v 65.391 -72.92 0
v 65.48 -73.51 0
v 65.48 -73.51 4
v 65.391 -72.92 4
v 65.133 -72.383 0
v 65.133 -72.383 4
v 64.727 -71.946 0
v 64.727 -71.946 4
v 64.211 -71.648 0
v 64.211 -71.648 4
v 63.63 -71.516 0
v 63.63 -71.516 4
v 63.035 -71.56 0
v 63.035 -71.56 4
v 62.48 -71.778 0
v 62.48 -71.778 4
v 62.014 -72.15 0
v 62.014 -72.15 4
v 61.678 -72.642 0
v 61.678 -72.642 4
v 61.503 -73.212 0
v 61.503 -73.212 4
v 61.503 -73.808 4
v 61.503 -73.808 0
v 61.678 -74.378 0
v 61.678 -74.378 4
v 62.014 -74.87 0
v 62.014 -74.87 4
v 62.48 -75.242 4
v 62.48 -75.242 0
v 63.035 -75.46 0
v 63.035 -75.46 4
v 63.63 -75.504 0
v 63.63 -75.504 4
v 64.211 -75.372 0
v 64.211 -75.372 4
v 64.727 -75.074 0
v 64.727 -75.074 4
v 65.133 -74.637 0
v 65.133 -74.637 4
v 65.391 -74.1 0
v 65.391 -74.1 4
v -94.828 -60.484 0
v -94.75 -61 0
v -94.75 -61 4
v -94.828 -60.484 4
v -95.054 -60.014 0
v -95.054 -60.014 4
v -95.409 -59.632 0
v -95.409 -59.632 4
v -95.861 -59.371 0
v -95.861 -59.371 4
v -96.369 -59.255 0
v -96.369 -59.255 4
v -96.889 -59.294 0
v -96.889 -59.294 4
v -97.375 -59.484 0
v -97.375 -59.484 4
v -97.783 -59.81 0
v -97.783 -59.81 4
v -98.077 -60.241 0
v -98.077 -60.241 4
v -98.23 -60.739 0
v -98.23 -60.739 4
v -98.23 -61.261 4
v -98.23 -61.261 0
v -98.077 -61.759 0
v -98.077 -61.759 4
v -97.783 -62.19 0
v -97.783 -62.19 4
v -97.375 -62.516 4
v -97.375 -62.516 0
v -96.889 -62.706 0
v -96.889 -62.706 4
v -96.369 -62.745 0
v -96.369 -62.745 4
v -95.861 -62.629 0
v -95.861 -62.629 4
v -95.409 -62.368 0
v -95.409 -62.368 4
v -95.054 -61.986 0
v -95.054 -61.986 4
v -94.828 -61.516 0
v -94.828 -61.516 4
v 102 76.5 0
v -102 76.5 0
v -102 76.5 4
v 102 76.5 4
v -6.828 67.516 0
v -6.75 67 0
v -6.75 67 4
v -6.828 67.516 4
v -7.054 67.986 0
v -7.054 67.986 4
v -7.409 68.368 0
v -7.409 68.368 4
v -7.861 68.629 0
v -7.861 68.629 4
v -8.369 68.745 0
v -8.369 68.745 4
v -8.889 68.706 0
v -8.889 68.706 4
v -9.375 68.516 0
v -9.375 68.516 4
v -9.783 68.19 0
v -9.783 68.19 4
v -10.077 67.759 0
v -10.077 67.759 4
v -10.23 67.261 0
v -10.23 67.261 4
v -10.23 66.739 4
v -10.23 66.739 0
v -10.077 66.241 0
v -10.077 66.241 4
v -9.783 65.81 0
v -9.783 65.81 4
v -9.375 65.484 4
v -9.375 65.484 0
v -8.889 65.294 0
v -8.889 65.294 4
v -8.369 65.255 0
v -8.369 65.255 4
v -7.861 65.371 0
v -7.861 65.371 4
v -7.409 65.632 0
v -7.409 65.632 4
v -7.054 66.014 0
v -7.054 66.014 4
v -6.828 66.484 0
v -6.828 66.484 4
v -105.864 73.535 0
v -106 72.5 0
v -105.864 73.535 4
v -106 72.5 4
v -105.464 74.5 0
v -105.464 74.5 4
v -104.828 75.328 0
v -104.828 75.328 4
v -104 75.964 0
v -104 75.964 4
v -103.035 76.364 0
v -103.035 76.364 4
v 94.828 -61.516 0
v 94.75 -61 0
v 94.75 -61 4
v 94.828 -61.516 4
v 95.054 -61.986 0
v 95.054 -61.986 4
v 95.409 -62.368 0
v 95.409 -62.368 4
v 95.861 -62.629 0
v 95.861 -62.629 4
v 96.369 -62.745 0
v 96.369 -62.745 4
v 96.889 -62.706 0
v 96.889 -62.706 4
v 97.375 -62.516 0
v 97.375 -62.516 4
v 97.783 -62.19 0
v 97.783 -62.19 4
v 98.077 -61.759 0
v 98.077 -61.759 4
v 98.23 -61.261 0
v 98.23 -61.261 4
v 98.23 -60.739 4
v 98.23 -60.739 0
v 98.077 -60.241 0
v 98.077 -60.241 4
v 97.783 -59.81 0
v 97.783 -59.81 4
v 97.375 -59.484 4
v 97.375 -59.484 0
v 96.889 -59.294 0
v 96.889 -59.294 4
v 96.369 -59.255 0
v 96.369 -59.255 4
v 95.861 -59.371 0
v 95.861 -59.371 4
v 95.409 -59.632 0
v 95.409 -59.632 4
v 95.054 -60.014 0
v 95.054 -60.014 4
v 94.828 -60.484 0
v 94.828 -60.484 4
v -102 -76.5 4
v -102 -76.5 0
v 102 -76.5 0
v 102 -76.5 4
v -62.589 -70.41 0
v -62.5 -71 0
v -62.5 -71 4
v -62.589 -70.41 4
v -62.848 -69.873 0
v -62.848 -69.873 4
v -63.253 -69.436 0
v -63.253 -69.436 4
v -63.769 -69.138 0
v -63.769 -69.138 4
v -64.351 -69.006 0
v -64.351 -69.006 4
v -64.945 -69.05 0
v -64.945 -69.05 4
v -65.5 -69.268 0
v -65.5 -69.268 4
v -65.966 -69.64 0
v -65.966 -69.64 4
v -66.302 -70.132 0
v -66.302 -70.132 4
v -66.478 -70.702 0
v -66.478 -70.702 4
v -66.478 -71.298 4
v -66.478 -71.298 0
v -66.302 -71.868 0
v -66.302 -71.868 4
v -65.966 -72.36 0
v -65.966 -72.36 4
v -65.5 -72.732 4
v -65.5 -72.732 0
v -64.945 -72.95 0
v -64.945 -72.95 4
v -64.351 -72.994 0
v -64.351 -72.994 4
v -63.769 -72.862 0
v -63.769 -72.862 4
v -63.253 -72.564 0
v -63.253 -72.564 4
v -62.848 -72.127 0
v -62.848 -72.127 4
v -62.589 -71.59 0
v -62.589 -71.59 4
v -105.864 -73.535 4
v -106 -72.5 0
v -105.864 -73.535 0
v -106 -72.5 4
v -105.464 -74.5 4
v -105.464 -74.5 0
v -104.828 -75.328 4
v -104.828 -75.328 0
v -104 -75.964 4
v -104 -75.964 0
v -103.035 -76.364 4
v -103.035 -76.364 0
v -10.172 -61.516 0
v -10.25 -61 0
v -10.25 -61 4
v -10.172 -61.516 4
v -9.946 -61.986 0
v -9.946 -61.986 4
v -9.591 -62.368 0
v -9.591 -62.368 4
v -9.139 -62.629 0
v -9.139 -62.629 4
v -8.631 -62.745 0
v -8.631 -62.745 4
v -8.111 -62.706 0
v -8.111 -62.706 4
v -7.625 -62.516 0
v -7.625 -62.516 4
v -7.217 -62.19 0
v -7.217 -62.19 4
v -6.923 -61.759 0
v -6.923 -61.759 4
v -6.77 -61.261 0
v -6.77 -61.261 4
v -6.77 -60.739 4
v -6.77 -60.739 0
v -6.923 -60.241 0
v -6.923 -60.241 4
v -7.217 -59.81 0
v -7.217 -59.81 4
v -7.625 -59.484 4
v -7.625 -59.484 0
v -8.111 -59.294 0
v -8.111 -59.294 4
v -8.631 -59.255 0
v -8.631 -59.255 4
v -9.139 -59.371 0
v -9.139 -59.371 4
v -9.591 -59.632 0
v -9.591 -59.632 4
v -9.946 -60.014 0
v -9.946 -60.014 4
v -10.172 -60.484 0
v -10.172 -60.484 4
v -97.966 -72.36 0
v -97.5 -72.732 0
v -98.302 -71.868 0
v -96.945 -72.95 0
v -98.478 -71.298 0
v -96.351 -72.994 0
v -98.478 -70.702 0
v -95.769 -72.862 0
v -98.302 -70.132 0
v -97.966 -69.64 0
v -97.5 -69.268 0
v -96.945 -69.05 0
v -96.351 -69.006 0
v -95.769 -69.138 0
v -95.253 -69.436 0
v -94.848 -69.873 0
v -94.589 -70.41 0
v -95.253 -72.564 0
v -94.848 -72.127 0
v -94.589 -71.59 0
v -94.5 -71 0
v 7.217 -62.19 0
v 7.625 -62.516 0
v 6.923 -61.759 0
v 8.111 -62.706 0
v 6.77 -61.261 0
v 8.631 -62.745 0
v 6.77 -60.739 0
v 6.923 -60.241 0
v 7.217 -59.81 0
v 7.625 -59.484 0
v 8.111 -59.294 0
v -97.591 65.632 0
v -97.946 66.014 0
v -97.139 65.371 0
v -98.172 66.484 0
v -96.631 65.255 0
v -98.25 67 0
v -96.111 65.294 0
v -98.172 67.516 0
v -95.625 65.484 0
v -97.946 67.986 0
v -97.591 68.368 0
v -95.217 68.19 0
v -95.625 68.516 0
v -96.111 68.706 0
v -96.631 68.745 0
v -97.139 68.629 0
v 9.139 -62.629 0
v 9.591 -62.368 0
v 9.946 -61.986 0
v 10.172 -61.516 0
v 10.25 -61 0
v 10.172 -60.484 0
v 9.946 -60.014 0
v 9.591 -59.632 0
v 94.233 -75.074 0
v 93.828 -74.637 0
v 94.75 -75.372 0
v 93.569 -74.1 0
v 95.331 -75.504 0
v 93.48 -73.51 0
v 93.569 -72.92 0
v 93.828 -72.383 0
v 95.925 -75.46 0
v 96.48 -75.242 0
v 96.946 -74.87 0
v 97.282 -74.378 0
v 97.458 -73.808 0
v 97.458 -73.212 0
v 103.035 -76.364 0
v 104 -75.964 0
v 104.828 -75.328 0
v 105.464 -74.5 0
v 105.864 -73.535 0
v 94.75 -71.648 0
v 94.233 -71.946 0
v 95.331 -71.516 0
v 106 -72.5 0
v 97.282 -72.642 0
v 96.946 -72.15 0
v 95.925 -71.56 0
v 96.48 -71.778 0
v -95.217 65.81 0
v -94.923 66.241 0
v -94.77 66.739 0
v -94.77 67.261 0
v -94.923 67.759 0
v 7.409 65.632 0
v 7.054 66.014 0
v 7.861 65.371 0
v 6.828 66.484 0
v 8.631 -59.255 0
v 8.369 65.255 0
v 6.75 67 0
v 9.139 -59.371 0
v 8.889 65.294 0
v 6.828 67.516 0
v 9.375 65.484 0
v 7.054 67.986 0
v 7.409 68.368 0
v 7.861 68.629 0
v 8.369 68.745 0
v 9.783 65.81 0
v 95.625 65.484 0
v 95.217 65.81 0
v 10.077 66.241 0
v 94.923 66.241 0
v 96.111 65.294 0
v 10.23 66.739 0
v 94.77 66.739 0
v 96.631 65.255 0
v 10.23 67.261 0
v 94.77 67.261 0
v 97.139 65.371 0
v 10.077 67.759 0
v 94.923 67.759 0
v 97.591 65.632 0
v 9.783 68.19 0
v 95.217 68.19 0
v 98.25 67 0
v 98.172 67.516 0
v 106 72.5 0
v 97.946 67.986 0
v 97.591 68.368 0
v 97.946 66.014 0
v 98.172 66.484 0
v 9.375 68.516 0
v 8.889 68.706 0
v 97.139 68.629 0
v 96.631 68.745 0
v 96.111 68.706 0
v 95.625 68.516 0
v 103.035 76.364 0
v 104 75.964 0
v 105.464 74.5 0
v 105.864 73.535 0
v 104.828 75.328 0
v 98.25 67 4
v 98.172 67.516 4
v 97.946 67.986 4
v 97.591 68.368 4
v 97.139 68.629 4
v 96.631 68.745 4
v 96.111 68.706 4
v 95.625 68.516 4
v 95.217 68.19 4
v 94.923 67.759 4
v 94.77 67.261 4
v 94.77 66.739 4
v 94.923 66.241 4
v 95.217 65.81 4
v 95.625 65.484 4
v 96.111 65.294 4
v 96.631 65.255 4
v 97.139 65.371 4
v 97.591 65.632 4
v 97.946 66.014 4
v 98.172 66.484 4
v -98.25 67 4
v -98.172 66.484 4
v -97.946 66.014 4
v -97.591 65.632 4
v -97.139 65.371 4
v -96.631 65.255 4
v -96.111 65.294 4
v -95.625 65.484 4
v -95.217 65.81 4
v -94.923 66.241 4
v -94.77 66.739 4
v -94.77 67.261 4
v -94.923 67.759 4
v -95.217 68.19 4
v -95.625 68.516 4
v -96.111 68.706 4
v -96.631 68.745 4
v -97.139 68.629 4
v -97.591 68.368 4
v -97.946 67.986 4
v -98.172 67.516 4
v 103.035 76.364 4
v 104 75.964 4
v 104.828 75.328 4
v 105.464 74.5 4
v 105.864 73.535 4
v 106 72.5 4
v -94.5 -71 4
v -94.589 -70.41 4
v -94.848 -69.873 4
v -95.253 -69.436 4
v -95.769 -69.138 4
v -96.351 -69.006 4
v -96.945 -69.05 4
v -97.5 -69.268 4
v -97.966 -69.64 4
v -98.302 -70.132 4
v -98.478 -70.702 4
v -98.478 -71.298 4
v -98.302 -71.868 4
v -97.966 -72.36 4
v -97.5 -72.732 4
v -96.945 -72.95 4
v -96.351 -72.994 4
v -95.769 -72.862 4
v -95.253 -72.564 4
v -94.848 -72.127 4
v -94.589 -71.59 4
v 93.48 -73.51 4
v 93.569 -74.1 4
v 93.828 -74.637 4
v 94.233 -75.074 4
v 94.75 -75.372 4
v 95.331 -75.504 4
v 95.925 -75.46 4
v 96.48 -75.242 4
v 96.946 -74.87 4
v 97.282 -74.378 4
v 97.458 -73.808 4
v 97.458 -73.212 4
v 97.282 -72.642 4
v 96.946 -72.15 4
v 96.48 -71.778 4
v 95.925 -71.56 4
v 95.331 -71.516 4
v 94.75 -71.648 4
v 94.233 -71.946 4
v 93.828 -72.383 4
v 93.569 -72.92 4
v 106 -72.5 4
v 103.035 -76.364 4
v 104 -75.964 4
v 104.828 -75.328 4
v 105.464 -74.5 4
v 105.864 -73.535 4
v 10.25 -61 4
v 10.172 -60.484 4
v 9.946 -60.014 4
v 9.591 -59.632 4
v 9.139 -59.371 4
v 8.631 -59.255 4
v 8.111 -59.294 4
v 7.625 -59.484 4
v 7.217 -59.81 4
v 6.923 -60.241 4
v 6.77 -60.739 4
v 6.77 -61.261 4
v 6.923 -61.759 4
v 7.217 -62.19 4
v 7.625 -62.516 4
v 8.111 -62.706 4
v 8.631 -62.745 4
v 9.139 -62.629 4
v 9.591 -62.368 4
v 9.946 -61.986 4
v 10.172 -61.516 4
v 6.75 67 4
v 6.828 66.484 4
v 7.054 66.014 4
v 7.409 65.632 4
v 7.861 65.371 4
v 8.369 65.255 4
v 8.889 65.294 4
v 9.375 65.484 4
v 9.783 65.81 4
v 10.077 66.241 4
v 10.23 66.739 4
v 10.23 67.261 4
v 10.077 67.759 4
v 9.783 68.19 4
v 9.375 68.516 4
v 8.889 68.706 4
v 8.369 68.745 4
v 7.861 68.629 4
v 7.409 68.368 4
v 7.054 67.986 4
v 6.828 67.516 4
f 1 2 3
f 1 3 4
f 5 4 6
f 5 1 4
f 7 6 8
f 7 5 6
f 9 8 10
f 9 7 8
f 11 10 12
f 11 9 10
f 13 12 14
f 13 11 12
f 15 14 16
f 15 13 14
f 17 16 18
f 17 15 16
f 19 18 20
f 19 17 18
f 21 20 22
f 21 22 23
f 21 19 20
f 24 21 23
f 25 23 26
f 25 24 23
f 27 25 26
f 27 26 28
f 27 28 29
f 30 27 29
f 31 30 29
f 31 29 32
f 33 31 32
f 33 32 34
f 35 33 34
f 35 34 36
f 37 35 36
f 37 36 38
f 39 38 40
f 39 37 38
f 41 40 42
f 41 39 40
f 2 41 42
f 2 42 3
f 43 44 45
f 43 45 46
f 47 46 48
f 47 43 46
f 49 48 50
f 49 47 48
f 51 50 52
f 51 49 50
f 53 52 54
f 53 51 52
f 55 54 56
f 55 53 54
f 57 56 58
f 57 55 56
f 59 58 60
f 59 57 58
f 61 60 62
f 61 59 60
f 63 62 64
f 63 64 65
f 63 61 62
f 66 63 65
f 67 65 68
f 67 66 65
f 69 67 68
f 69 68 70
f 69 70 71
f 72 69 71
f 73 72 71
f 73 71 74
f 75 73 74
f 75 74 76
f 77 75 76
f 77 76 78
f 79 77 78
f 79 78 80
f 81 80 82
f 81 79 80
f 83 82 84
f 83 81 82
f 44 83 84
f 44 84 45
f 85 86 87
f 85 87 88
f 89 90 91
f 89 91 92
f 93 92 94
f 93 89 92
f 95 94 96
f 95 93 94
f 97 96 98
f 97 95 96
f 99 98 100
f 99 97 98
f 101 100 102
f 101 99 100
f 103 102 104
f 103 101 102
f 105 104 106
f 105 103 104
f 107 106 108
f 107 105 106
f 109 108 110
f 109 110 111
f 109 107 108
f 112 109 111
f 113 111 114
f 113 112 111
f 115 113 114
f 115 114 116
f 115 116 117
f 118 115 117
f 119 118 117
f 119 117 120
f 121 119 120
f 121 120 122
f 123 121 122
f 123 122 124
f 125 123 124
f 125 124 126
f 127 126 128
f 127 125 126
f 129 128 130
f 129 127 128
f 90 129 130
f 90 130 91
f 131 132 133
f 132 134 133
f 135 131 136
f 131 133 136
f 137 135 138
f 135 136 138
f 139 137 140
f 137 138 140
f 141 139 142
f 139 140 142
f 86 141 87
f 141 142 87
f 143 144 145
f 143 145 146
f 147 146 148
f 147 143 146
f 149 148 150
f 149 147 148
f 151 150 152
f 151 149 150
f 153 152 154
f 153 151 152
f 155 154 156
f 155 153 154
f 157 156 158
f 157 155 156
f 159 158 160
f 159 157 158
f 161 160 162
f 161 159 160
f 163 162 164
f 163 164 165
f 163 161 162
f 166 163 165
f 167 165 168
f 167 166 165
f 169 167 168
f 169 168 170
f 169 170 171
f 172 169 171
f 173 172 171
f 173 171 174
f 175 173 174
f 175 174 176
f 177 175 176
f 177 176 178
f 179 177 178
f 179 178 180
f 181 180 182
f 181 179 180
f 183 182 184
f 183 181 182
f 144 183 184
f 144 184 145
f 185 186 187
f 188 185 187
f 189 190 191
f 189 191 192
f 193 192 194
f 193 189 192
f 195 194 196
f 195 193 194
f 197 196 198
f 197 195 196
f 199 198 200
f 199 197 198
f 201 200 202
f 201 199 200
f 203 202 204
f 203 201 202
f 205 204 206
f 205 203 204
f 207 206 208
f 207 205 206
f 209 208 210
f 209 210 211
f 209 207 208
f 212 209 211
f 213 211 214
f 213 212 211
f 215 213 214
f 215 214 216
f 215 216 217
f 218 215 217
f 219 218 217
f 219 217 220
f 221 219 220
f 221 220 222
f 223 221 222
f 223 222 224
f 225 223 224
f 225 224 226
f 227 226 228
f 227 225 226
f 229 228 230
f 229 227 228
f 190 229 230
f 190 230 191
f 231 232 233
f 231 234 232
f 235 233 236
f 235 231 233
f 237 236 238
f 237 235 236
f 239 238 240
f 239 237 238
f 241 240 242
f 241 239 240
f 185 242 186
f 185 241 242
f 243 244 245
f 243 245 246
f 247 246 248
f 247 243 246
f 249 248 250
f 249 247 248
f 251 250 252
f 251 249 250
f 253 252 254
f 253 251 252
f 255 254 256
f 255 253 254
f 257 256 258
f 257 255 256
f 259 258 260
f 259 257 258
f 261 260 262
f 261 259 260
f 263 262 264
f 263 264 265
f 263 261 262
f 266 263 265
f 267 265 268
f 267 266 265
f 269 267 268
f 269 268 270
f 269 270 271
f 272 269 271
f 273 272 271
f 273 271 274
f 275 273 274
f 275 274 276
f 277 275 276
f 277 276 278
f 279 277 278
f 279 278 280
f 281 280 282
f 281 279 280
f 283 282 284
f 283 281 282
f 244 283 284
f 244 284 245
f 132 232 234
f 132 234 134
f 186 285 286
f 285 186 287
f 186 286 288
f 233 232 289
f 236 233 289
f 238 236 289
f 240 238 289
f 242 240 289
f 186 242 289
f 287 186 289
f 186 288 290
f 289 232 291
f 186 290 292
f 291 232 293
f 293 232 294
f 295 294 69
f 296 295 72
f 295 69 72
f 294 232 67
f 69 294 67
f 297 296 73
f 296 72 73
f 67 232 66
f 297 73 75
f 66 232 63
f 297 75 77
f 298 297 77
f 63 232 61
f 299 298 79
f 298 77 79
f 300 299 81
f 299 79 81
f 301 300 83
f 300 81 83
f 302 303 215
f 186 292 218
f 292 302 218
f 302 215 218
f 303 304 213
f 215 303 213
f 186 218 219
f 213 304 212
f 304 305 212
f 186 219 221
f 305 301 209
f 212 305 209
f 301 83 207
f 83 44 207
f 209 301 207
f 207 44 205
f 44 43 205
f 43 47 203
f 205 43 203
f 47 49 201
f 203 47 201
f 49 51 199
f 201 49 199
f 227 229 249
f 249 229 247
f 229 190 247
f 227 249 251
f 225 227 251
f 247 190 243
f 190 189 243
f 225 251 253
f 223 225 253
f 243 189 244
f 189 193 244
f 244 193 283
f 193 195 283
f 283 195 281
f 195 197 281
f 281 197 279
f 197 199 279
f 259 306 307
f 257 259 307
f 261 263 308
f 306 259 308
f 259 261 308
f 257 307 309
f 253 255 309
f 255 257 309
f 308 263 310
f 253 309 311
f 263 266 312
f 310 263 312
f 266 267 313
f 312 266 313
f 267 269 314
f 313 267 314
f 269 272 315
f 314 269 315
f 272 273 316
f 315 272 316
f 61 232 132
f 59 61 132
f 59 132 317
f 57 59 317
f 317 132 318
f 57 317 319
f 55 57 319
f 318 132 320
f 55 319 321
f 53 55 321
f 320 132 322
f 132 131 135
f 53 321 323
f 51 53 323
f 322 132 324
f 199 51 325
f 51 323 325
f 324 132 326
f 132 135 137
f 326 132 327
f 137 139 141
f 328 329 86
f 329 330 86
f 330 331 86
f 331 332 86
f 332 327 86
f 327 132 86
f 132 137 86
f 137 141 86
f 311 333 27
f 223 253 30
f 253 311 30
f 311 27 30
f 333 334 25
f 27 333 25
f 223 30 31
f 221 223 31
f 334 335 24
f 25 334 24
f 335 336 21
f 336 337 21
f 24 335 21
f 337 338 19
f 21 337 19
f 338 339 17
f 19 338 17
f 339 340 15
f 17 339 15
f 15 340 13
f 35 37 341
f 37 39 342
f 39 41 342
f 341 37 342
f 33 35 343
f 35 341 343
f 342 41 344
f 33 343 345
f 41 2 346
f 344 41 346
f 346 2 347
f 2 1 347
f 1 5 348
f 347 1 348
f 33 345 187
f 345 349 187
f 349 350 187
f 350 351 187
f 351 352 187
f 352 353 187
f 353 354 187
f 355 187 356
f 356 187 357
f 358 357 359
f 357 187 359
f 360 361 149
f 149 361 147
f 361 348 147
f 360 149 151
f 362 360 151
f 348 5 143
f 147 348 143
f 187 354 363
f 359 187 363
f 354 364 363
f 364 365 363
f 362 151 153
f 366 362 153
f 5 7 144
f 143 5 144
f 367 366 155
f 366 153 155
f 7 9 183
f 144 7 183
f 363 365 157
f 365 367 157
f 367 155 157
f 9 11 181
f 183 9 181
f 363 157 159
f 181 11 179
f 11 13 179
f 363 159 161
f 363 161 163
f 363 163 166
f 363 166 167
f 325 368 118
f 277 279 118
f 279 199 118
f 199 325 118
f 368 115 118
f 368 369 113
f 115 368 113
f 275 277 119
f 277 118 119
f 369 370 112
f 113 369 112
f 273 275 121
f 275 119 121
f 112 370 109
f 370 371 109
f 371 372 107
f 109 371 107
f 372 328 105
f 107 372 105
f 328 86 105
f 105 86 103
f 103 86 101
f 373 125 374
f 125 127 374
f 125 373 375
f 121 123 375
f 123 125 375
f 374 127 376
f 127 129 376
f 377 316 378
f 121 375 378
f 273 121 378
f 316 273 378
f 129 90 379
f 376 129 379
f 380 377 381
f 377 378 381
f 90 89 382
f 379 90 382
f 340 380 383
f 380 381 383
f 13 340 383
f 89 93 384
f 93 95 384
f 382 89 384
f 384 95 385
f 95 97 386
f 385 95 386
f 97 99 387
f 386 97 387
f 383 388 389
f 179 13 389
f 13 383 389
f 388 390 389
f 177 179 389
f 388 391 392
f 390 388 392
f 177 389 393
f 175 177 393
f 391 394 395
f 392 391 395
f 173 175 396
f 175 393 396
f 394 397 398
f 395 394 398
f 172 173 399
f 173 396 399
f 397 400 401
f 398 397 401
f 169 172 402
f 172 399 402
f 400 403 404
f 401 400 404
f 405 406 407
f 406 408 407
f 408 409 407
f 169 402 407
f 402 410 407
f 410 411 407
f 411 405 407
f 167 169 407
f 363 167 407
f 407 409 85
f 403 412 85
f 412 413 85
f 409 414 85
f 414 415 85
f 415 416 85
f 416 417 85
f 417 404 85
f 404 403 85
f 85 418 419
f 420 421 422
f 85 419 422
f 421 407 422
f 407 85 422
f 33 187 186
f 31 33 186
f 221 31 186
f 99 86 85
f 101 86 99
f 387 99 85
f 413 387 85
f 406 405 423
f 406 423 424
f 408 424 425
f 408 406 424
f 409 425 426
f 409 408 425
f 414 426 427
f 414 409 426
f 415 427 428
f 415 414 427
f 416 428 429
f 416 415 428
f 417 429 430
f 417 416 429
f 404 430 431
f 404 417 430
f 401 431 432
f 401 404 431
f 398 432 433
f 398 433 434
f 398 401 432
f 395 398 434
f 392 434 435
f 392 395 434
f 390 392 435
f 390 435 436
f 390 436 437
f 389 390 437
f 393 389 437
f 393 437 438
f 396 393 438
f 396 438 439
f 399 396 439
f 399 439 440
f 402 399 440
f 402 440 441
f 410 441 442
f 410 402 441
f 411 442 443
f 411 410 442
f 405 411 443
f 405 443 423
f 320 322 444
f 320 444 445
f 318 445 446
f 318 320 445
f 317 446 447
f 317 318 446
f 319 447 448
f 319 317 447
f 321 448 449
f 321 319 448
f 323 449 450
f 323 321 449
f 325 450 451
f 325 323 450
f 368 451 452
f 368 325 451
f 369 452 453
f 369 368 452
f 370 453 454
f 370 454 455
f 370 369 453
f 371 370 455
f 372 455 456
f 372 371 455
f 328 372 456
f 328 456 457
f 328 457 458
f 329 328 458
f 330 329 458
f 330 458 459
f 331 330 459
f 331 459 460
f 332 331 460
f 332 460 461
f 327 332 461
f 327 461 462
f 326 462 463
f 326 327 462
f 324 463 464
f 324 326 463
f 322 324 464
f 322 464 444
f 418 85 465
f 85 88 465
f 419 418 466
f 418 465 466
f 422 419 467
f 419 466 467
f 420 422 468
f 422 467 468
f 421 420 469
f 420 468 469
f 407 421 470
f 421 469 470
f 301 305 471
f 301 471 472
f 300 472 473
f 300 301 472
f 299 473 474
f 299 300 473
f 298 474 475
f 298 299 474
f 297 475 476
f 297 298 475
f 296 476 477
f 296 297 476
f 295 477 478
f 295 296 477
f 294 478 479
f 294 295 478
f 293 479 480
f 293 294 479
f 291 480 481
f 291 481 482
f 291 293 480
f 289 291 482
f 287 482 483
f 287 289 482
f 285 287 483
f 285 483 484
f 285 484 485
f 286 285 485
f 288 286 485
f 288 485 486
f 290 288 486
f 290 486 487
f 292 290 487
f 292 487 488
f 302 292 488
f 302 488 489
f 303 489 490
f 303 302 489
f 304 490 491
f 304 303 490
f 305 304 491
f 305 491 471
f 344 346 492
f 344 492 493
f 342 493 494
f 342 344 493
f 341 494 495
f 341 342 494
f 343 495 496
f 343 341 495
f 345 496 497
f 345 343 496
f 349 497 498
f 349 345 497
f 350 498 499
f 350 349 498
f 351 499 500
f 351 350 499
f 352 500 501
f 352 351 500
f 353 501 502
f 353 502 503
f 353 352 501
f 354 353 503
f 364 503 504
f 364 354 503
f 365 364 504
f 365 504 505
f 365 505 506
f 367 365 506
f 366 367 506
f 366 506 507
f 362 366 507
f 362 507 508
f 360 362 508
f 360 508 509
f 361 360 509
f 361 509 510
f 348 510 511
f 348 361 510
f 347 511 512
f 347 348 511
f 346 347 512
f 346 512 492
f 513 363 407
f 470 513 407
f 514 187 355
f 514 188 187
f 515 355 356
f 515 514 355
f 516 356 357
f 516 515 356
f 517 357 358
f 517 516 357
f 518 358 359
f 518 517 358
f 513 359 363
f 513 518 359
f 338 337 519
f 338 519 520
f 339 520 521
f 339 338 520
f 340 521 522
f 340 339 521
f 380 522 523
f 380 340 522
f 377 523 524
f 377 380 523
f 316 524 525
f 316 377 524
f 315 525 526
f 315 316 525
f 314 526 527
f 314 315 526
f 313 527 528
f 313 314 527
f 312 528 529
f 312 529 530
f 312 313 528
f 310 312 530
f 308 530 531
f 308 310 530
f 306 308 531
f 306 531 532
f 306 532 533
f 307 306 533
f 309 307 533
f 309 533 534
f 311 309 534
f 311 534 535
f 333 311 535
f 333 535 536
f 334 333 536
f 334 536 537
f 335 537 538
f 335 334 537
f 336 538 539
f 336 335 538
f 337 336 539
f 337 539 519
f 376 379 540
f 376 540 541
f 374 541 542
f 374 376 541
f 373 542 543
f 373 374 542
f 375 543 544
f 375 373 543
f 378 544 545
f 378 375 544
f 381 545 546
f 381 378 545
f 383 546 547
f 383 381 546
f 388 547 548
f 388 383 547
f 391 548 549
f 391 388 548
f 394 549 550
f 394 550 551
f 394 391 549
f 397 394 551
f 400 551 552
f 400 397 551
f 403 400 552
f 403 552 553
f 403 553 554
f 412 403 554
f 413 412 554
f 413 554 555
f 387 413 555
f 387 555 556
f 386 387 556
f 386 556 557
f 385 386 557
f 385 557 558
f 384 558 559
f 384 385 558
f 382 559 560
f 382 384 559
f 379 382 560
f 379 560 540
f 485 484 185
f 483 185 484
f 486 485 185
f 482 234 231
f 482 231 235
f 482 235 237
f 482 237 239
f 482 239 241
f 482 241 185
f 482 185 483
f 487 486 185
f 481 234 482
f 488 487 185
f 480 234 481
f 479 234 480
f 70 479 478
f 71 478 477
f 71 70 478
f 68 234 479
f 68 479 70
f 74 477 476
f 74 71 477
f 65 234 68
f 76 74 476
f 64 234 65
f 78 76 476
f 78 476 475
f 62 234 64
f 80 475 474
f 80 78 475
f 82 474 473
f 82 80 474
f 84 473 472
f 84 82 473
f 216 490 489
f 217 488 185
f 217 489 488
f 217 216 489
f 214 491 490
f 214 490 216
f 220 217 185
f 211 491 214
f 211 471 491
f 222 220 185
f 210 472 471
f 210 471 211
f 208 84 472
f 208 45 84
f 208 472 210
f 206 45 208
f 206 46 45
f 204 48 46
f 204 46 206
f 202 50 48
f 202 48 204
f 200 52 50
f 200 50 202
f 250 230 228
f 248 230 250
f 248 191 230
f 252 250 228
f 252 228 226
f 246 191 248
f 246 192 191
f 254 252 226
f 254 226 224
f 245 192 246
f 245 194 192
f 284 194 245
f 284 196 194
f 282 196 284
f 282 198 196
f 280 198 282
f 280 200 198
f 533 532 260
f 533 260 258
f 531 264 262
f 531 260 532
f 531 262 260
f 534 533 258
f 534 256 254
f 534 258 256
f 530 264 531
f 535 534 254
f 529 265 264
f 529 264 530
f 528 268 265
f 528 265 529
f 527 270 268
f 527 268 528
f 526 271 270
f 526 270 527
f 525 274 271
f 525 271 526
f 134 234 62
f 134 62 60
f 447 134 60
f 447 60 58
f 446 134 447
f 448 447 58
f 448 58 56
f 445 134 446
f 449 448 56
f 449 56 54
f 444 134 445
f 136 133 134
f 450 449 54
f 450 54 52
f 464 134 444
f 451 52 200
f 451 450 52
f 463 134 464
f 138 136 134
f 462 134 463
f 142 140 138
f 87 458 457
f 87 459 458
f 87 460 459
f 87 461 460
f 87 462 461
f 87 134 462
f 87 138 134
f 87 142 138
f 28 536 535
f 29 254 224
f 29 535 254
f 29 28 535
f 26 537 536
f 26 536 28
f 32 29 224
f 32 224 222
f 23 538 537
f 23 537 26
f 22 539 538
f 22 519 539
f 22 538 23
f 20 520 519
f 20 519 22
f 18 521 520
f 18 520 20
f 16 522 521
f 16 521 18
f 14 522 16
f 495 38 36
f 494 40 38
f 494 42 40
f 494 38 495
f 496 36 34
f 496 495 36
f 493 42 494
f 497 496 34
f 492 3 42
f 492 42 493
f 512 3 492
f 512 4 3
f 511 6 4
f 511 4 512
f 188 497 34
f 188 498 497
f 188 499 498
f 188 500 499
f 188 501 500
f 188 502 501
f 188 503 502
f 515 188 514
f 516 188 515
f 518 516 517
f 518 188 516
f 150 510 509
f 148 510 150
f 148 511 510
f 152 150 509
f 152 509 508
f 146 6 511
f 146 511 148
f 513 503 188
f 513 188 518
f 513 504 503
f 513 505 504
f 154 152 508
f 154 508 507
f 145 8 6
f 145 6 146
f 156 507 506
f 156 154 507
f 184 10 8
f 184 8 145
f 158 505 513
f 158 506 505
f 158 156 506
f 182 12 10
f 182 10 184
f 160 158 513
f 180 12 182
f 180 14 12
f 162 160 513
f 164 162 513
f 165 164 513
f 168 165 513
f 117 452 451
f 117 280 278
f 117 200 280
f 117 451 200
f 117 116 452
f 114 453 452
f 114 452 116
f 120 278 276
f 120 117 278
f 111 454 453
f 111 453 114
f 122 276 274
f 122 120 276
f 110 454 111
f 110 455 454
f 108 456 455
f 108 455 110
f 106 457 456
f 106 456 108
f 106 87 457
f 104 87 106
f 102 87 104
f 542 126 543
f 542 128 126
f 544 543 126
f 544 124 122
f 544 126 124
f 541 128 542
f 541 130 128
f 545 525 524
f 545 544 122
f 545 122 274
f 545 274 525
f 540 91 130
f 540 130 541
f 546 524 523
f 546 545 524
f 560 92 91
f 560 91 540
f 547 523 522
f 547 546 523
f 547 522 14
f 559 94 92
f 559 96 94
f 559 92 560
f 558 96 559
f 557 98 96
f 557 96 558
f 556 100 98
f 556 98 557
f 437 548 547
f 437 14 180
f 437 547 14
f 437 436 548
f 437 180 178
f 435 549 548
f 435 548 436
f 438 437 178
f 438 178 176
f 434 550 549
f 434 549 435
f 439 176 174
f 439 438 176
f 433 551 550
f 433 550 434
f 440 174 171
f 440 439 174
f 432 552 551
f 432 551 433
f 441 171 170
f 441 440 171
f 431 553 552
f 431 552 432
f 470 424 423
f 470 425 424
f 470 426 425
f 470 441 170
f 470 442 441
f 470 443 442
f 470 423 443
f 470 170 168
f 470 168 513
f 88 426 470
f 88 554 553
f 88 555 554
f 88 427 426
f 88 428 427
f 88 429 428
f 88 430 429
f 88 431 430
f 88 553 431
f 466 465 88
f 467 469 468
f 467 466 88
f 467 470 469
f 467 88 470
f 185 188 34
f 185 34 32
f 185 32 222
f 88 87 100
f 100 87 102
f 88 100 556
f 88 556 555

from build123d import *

# Parameters (mm, degrees)
SKETCH1_W           = 212
SKETCH1_H           = 153
SKETCH1_R           = 1.75
SKETCH1_R_2         = 2
BOSS_EXTRUDE1_DEPTH = 4
FILLET1_R           = 4


with BuildPart() as part:
    # Sketch1 → Boss-Extrude1 (new body)
    with BuildSketch(Plane.XY):
        Rectangle(SKETCH1_W, SKETCH1_H)
        with Locations((-96.5, -61)):
            Circle(SKETCH1_R, mode=Mode.SUBTRACT)
        with Locations(Location((-8.5, -61, 0), (0, 0, 180))):
            Circle(SKETCH1_R, mode=Mode.SUBTRACT)
        with Locations((8.5, -61)):
            Circle(SKETCH1_R, mode=Mode.SUBTRACT)
        with Locations(Location((96.5, -61, 0), (0, 0, 180))):
            Circle(SKETCH1_R, mode=Mode.SUBTRACT)
        with Locations(Location((-96.5, 67, 0), (0, 0, 180))):
            Circle(SKETCH1_R, mode=Mode.SUBTRACT)
        with Locations((96.5, 67)):
            Circle(SKETCH1_R, mode=Mode.SUBTRACT)
        with Locations(Location((8.5, 67, 0), (0, 0, 180))):
            Circle(SKETCH1_R, mode=Mode.SUBTRACT)
        with Locations((-8.5, 67)):
            Circle(SKETCH1_R, mode=Mode.SUBTRACT)
        with Locations((-96.5, -71)):
            Circle(SKETCH1_R_2, mode=Mode.SUBTRACT)
        with Locations(Location((95.480310976, -73.51, 0), (0, 0, 180))):
            Circle(SKETCH1_R_2, mode=Mode.SUBTRACT)
        with Locations((-64.5, -71)):
            Circle(SKETCH1_R_2, mode=Mode.SUBTRACT)
        with Locations((63.480310976, -73.51)):
            Circle(SKETCH1_R_2, mode=Mode.SUBTRACT)
    extrude(amount=BOSS_EXTRUDE1_DEPTH)

    # Fillet1
    fillet1_edges = [part.edges().sort_by_distance(p)[0] for p in [
        (-106, 76.5, 2),
        (106, 76.5, 2),
        (106, -76.5, 2),
        (-106, -76.5, 2),
    ]]
    fillet(fillet1_edges, radius=FILLET1_R)


solid = part.part
